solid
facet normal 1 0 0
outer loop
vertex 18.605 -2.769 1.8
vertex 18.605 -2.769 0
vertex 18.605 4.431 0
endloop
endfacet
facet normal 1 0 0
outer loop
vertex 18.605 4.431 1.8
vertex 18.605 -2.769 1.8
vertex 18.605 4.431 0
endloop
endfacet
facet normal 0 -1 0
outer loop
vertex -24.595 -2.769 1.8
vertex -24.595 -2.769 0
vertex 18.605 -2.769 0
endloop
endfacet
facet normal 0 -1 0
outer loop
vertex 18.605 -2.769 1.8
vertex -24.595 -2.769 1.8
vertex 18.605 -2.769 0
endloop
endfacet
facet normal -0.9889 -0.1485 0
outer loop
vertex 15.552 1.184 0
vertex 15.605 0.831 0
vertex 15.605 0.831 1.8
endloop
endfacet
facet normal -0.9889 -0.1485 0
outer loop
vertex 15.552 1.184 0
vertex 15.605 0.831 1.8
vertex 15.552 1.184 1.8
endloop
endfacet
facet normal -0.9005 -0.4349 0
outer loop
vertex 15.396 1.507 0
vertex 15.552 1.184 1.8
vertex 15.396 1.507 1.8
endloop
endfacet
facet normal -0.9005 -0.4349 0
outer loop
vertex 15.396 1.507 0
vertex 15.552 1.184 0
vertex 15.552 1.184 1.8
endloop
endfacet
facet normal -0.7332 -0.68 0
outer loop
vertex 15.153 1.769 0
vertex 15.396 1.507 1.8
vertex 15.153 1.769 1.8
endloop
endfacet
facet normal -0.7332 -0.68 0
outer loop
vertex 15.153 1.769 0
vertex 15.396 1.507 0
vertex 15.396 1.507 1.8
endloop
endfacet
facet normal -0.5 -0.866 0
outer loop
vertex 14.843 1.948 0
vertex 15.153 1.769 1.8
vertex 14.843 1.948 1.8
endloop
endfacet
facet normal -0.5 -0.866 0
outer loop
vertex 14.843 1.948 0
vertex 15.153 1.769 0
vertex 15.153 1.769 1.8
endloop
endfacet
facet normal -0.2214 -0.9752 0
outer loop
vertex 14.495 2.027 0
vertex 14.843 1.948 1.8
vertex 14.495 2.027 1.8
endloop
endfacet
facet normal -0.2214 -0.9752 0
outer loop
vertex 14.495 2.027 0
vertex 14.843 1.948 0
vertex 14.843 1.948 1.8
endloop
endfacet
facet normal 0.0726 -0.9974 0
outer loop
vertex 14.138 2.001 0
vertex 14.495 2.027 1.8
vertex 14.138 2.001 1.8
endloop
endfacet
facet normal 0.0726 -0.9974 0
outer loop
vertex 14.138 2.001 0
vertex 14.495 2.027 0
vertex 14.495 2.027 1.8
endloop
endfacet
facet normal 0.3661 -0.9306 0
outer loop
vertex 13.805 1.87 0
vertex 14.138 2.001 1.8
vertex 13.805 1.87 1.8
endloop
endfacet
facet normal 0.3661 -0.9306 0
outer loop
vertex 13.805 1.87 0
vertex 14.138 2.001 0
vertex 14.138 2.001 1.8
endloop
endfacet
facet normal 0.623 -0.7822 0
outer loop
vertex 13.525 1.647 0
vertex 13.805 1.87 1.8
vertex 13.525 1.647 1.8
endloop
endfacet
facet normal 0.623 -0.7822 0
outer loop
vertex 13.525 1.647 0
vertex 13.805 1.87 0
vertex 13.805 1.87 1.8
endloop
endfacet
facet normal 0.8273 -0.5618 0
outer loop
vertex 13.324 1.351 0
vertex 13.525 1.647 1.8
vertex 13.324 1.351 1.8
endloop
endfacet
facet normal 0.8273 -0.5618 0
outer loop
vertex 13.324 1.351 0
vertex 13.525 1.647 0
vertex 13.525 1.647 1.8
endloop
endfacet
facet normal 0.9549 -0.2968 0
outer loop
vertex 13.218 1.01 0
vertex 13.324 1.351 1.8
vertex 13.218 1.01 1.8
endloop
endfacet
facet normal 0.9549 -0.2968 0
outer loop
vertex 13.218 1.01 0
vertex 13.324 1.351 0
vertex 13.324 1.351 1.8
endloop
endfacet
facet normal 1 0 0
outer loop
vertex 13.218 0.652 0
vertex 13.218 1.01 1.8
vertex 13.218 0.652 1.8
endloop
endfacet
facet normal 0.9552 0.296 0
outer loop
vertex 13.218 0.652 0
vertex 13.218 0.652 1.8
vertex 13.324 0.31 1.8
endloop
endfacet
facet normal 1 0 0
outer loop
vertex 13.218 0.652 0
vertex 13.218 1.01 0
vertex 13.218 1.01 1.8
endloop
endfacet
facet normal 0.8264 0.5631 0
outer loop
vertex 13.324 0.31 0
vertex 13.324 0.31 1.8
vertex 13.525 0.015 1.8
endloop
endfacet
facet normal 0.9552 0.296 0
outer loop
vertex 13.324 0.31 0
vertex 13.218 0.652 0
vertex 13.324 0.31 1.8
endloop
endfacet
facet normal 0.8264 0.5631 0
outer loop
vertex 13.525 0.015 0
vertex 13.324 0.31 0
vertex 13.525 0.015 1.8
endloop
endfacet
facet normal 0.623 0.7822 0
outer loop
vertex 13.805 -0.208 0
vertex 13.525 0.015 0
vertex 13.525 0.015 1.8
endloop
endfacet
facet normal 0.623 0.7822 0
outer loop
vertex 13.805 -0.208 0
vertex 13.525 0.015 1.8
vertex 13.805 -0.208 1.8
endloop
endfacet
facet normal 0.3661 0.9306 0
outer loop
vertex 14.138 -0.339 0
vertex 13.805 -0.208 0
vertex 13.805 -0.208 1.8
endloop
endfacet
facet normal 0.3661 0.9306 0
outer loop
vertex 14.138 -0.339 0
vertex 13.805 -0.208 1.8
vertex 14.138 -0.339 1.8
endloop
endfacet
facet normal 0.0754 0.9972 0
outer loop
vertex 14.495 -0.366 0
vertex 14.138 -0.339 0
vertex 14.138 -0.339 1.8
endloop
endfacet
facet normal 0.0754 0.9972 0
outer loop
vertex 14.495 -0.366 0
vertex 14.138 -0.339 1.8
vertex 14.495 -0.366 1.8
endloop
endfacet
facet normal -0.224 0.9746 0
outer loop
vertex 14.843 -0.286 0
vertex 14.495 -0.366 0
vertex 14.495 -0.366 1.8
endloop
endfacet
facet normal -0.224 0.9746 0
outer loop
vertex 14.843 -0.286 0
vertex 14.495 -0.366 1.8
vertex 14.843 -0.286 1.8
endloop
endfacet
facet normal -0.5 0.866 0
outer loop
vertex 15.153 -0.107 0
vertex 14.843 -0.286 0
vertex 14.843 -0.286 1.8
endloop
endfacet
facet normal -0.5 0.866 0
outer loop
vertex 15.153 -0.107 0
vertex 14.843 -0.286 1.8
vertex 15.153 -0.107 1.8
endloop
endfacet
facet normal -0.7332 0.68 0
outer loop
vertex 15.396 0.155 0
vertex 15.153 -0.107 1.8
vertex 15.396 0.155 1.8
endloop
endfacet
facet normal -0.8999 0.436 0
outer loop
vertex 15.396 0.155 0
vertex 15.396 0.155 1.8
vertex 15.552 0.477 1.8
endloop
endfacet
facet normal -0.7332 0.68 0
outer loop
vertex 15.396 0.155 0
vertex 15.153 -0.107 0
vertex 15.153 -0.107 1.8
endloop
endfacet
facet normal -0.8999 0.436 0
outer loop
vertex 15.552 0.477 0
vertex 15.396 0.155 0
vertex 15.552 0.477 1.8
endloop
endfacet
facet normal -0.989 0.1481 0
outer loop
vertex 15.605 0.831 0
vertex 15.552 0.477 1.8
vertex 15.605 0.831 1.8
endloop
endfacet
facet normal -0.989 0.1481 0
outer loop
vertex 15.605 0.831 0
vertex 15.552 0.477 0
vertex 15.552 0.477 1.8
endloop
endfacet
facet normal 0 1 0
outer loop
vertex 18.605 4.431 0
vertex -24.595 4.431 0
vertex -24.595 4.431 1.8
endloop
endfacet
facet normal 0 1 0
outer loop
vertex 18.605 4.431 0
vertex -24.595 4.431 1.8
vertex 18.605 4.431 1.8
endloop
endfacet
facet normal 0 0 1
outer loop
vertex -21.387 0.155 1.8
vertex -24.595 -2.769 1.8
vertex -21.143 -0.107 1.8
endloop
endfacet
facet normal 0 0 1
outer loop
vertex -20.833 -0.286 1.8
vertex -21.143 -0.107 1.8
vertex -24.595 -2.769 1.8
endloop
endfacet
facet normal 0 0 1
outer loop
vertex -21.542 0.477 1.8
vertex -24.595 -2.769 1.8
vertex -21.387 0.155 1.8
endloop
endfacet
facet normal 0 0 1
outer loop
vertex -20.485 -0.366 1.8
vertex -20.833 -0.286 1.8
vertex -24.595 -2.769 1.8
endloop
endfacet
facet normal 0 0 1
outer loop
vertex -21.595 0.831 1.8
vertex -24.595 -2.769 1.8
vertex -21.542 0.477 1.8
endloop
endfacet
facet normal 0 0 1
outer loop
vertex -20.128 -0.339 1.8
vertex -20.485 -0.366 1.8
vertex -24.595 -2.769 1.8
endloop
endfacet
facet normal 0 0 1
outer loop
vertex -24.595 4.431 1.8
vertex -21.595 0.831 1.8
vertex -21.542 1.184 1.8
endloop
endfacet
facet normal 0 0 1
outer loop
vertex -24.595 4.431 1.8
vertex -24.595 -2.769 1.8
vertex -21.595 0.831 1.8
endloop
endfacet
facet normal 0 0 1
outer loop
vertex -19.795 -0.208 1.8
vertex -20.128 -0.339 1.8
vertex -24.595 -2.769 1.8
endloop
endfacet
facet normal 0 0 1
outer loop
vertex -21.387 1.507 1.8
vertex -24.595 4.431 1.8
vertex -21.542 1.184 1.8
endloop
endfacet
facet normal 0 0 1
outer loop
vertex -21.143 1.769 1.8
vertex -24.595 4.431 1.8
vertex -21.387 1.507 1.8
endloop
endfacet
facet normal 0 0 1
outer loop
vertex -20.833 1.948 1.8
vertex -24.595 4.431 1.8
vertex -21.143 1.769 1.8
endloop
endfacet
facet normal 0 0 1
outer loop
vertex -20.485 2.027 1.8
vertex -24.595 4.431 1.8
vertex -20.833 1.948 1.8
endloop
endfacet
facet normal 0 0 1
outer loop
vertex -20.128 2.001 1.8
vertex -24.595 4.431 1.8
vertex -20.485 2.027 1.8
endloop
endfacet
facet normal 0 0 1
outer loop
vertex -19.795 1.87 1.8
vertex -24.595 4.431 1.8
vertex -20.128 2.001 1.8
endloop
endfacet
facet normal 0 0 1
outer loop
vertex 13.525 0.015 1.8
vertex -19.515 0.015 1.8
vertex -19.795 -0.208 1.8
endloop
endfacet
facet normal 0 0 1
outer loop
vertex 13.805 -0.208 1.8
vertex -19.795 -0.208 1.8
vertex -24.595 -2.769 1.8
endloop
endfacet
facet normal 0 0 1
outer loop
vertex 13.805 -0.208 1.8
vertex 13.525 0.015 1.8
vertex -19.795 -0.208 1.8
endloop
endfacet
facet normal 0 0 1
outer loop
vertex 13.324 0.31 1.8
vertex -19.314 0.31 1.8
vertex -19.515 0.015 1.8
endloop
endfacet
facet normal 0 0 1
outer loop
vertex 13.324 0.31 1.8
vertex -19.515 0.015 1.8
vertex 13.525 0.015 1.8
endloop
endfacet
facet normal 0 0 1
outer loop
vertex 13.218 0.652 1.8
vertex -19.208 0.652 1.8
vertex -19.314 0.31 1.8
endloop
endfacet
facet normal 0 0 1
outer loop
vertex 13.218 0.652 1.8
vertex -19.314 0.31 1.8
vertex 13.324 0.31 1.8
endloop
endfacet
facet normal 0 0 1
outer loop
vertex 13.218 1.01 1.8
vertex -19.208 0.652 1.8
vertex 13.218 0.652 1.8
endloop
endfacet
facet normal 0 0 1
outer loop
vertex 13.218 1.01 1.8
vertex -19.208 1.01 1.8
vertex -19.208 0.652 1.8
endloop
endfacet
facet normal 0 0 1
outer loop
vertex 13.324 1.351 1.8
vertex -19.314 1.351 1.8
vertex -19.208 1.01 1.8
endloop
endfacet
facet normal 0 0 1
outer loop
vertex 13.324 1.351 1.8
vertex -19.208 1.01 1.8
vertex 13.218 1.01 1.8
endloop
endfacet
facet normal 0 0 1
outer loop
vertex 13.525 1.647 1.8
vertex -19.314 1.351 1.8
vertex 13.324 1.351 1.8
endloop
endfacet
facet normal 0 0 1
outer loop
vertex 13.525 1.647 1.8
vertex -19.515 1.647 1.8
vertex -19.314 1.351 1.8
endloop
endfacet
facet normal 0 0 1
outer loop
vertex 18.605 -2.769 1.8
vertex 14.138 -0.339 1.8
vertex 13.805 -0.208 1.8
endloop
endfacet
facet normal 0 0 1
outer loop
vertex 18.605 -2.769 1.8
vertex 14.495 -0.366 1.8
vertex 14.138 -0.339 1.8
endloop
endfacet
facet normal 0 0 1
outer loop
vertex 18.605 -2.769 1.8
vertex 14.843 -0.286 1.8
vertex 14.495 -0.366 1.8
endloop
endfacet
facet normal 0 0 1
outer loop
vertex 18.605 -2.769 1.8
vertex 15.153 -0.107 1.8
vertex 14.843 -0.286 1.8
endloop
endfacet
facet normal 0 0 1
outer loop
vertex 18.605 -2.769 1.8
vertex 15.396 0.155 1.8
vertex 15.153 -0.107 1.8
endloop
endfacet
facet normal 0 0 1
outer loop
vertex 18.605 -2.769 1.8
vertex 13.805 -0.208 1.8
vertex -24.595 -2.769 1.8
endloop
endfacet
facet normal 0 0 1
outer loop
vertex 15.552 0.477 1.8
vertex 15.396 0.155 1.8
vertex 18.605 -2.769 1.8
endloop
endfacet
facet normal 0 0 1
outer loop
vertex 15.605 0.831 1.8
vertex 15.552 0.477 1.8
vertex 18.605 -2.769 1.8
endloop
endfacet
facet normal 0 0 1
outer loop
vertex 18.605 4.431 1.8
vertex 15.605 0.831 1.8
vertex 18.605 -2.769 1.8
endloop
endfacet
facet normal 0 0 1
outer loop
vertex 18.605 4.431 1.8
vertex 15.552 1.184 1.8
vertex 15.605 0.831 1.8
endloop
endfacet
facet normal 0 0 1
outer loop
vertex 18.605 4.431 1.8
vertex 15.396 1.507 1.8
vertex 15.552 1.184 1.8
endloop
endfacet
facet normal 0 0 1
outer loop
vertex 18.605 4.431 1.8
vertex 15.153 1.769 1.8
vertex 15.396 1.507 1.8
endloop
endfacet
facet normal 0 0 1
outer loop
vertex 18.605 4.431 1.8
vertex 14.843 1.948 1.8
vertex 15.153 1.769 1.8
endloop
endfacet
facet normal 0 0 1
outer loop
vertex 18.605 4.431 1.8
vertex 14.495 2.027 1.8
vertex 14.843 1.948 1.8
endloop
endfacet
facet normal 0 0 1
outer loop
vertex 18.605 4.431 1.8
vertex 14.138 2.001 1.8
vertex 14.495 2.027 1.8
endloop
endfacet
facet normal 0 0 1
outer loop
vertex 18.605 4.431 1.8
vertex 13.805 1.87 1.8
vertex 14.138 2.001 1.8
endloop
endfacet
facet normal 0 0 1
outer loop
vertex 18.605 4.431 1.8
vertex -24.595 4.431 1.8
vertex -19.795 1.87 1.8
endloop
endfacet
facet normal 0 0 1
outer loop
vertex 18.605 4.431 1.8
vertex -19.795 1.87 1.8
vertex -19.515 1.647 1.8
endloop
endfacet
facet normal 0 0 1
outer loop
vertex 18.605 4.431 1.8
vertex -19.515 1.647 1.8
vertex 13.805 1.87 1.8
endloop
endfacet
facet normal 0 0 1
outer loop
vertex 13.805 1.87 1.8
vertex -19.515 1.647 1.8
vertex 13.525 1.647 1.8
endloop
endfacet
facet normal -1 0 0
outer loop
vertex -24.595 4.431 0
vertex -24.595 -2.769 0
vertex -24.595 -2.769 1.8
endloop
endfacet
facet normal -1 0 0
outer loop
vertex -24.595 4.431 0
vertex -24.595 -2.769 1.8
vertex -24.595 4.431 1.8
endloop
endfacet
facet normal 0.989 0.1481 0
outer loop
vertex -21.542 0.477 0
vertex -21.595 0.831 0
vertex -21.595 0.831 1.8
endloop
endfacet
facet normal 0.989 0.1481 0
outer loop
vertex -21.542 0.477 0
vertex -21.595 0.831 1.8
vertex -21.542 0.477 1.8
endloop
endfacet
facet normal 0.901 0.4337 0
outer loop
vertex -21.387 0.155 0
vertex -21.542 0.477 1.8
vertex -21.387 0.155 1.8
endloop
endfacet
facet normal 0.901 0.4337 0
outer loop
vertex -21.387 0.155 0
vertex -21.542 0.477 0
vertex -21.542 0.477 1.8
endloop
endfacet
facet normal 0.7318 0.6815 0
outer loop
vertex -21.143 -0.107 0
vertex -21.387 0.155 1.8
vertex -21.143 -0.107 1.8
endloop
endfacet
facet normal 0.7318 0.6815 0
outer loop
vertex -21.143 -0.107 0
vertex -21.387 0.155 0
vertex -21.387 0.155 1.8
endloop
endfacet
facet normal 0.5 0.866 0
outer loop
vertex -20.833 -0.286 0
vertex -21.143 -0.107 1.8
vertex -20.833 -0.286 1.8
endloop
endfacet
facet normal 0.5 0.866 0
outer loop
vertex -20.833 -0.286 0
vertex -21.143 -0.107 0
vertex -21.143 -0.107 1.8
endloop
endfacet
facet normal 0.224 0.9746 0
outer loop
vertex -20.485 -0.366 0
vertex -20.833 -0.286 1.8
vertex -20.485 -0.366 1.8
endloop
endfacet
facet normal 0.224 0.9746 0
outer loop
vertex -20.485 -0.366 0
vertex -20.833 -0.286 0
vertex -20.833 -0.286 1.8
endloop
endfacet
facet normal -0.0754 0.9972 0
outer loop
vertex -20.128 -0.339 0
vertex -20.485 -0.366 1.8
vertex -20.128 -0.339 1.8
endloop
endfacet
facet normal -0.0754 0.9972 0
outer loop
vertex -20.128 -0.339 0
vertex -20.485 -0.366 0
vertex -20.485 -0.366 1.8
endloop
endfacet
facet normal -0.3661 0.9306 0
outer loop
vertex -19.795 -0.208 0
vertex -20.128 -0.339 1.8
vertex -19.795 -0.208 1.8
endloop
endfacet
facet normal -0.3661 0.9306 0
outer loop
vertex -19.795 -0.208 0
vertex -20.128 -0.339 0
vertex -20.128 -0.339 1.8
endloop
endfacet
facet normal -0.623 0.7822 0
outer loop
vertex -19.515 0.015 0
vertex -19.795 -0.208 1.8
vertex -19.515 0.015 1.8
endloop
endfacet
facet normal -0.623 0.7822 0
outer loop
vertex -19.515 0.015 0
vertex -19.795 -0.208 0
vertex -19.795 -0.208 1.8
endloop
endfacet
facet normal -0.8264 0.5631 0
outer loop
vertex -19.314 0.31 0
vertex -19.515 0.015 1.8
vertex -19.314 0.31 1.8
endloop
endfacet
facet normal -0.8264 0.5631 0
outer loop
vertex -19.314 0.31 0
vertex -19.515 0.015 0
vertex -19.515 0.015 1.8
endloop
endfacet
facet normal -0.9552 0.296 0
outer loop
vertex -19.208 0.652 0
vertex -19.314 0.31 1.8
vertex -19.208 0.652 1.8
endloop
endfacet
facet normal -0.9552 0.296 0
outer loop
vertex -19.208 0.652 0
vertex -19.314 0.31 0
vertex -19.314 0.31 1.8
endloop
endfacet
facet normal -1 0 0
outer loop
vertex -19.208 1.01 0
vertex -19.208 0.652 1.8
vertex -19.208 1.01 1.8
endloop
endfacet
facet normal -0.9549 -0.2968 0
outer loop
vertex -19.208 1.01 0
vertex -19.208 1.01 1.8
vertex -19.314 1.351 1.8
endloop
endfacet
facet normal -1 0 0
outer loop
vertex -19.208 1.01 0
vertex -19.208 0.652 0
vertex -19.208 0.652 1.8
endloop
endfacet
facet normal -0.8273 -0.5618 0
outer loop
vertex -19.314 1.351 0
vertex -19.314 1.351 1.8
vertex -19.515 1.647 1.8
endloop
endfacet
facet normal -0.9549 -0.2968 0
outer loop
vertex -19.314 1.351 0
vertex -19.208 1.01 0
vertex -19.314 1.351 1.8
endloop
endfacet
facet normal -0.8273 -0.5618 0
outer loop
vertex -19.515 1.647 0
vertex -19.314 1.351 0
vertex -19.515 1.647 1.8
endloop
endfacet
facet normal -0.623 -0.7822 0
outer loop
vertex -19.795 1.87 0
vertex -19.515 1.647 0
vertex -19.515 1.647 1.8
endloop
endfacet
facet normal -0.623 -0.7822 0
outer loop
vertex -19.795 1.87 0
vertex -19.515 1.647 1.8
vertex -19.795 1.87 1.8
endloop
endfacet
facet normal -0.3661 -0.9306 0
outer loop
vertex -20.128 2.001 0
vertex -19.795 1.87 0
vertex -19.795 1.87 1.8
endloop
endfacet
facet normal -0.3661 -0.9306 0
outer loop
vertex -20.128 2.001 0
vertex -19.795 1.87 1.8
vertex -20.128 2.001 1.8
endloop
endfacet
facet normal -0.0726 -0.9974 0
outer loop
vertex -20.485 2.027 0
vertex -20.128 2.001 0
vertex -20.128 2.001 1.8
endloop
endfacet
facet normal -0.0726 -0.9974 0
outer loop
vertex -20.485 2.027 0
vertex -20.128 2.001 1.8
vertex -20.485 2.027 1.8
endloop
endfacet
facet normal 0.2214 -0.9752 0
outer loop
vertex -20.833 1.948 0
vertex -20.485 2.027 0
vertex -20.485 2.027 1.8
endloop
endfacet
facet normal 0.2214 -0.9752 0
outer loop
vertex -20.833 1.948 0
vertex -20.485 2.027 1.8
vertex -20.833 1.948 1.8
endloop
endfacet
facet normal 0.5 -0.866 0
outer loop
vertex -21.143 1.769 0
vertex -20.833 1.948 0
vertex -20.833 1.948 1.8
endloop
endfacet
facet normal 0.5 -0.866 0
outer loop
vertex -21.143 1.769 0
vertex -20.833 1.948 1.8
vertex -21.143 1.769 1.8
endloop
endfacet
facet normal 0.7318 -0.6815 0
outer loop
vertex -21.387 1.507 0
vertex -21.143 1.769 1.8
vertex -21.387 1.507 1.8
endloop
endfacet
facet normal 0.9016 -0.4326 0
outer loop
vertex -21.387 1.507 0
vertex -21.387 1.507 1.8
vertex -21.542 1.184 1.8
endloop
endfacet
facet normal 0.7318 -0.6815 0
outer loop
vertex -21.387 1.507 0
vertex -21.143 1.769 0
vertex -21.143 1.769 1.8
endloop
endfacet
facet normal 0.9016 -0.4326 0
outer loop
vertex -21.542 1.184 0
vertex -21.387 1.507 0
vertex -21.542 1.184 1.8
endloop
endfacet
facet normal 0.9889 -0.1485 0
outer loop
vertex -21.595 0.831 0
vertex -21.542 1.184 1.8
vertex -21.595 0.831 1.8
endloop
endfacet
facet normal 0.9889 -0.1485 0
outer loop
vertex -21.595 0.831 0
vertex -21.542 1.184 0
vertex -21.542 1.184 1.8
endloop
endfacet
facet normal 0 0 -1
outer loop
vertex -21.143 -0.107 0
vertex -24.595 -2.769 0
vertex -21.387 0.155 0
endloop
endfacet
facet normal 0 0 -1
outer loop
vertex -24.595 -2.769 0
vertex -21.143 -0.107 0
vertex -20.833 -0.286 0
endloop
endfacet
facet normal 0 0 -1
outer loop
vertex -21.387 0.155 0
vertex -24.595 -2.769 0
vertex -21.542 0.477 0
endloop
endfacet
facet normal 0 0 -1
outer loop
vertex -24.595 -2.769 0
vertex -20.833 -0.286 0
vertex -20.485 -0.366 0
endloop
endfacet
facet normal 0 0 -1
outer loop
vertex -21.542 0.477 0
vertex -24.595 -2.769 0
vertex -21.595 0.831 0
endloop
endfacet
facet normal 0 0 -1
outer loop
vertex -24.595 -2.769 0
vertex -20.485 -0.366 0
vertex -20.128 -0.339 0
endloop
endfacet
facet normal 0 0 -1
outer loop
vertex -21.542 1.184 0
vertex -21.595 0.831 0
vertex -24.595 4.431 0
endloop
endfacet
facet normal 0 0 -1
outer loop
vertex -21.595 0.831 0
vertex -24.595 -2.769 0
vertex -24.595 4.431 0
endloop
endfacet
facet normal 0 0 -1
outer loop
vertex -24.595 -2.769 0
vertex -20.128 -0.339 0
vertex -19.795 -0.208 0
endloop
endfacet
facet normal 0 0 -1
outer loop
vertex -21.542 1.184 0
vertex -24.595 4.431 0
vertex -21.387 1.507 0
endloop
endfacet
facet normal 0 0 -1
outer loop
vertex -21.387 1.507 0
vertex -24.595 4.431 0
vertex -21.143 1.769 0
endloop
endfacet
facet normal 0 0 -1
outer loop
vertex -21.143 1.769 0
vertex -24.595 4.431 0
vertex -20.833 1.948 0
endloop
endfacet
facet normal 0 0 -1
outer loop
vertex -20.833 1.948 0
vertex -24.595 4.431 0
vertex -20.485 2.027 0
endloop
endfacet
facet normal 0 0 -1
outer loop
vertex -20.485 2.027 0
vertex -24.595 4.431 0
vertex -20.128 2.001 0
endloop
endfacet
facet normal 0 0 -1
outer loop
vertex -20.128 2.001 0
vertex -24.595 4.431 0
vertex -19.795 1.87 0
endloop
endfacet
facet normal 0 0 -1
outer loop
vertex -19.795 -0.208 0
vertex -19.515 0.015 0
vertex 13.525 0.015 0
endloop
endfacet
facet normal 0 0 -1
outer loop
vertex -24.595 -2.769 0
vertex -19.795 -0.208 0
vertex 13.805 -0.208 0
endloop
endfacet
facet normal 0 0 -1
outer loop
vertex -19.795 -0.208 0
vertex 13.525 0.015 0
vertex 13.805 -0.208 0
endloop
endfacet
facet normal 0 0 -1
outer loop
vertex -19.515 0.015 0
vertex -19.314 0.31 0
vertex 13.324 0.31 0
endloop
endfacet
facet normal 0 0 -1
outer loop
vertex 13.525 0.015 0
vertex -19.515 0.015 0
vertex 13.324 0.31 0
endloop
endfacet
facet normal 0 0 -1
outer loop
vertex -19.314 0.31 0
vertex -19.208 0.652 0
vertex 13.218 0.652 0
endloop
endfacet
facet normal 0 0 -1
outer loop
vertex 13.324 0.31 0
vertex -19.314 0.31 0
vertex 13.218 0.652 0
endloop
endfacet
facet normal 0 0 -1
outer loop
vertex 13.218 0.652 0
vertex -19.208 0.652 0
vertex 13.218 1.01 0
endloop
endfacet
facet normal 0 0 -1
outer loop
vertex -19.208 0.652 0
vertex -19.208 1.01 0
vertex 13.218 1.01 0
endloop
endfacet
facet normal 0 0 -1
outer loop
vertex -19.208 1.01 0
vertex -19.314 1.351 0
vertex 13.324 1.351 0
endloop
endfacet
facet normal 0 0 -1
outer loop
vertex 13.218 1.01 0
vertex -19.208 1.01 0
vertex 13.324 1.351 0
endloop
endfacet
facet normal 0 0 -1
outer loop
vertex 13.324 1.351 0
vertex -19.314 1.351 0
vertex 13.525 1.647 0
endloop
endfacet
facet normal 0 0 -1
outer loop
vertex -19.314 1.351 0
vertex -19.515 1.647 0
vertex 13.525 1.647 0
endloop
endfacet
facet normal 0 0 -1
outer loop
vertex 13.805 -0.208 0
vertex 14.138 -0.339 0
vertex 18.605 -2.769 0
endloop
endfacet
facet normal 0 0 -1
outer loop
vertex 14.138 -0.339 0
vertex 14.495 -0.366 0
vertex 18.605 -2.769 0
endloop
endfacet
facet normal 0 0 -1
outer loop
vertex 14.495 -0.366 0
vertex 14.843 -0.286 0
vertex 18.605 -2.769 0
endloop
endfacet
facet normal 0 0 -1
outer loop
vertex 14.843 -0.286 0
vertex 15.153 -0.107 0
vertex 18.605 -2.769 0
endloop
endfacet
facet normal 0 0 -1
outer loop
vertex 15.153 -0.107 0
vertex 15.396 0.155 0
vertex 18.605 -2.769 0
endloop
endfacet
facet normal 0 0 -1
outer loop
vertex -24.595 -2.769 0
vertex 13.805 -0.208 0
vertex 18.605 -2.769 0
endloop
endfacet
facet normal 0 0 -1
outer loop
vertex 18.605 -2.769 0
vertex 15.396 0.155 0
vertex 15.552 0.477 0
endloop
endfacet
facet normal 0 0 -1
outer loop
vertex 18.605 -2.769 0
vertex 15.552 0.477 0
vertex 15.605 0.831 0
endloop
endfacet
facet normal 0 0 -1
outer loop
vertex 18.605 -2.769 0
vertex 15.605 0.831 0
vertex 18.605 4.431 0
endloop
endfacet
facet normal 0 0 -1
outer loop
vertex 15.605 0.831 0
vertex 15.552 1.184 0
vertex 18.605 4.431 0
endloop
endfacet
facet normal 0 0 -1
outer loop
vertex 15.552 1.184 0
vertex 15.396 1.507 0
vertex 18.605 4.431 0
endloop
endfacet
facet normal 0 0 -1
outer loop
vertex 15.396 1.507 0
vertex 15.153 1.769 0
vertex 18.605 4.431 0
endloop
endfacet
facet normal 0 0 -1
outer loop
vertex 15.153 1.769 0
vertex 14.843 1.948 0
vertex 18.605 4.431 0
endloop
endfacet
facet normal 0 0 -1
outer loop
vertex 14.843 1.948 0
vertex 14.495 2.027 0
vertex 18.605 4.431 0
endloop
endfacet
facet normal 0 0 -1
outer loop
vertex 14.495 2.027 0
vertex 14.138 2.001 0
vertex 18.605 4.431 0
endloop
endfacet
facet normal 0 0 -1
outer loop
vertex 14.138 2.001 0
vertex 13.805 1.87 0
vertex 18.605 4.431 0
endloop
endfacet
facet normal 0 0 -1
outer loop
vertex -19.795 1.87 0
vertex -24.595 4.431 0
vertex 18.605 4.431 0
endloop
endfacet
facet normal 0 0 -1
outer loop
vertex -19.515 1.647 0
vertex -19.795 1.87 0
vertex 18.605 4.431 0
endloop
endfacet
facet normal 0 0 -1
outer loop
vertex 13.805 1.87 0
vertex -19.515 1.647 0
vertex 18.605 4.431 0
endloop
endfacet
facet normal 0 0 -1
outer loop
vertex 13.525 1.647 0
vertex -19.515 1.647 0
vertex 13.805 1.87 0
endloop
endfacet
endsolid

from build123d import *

# Parameters (mm, degrees)
ESQUISSE1_W             = 43.2
ESQUISSE1_H             = 7.2
BOSS_EXTRU_1_DEPTH      = 1.8
ESQUISSE2_R             = 1.2
ENL_V_MAT_EXTRU_1_DEPTH = 1.8


with BuildPart() as part:
    # Esquisse1 → Boss.-Extru.1 (new body)
    with BuildSketch(Plane.XY):
        with Locations((-2.995022473, 0.830769231)):
            Rectangle(ESQUISSE1_W, ESQUISSE1_H)
    extrude(amount=BOSS_EXTRU_1_DEPTH)

    # Esquisse2 → Enlèv. mat.-Extru.1 (cut)
    with BuildSketch(Plane.XY):
        with Locations((14.404977527, 0.830769231)):
            Circle(ESQUISSE2_R)
        with Locations(Location((-20.395022473, 0.830769231, 0), (0, 0, 180))):
            Circle(ESQUISSE2_R)
    extrude(amount=ENL_V_MAT_EXTRU_1_DEPTH, mode=Mode.SUBTRACT)


solid = part.part
